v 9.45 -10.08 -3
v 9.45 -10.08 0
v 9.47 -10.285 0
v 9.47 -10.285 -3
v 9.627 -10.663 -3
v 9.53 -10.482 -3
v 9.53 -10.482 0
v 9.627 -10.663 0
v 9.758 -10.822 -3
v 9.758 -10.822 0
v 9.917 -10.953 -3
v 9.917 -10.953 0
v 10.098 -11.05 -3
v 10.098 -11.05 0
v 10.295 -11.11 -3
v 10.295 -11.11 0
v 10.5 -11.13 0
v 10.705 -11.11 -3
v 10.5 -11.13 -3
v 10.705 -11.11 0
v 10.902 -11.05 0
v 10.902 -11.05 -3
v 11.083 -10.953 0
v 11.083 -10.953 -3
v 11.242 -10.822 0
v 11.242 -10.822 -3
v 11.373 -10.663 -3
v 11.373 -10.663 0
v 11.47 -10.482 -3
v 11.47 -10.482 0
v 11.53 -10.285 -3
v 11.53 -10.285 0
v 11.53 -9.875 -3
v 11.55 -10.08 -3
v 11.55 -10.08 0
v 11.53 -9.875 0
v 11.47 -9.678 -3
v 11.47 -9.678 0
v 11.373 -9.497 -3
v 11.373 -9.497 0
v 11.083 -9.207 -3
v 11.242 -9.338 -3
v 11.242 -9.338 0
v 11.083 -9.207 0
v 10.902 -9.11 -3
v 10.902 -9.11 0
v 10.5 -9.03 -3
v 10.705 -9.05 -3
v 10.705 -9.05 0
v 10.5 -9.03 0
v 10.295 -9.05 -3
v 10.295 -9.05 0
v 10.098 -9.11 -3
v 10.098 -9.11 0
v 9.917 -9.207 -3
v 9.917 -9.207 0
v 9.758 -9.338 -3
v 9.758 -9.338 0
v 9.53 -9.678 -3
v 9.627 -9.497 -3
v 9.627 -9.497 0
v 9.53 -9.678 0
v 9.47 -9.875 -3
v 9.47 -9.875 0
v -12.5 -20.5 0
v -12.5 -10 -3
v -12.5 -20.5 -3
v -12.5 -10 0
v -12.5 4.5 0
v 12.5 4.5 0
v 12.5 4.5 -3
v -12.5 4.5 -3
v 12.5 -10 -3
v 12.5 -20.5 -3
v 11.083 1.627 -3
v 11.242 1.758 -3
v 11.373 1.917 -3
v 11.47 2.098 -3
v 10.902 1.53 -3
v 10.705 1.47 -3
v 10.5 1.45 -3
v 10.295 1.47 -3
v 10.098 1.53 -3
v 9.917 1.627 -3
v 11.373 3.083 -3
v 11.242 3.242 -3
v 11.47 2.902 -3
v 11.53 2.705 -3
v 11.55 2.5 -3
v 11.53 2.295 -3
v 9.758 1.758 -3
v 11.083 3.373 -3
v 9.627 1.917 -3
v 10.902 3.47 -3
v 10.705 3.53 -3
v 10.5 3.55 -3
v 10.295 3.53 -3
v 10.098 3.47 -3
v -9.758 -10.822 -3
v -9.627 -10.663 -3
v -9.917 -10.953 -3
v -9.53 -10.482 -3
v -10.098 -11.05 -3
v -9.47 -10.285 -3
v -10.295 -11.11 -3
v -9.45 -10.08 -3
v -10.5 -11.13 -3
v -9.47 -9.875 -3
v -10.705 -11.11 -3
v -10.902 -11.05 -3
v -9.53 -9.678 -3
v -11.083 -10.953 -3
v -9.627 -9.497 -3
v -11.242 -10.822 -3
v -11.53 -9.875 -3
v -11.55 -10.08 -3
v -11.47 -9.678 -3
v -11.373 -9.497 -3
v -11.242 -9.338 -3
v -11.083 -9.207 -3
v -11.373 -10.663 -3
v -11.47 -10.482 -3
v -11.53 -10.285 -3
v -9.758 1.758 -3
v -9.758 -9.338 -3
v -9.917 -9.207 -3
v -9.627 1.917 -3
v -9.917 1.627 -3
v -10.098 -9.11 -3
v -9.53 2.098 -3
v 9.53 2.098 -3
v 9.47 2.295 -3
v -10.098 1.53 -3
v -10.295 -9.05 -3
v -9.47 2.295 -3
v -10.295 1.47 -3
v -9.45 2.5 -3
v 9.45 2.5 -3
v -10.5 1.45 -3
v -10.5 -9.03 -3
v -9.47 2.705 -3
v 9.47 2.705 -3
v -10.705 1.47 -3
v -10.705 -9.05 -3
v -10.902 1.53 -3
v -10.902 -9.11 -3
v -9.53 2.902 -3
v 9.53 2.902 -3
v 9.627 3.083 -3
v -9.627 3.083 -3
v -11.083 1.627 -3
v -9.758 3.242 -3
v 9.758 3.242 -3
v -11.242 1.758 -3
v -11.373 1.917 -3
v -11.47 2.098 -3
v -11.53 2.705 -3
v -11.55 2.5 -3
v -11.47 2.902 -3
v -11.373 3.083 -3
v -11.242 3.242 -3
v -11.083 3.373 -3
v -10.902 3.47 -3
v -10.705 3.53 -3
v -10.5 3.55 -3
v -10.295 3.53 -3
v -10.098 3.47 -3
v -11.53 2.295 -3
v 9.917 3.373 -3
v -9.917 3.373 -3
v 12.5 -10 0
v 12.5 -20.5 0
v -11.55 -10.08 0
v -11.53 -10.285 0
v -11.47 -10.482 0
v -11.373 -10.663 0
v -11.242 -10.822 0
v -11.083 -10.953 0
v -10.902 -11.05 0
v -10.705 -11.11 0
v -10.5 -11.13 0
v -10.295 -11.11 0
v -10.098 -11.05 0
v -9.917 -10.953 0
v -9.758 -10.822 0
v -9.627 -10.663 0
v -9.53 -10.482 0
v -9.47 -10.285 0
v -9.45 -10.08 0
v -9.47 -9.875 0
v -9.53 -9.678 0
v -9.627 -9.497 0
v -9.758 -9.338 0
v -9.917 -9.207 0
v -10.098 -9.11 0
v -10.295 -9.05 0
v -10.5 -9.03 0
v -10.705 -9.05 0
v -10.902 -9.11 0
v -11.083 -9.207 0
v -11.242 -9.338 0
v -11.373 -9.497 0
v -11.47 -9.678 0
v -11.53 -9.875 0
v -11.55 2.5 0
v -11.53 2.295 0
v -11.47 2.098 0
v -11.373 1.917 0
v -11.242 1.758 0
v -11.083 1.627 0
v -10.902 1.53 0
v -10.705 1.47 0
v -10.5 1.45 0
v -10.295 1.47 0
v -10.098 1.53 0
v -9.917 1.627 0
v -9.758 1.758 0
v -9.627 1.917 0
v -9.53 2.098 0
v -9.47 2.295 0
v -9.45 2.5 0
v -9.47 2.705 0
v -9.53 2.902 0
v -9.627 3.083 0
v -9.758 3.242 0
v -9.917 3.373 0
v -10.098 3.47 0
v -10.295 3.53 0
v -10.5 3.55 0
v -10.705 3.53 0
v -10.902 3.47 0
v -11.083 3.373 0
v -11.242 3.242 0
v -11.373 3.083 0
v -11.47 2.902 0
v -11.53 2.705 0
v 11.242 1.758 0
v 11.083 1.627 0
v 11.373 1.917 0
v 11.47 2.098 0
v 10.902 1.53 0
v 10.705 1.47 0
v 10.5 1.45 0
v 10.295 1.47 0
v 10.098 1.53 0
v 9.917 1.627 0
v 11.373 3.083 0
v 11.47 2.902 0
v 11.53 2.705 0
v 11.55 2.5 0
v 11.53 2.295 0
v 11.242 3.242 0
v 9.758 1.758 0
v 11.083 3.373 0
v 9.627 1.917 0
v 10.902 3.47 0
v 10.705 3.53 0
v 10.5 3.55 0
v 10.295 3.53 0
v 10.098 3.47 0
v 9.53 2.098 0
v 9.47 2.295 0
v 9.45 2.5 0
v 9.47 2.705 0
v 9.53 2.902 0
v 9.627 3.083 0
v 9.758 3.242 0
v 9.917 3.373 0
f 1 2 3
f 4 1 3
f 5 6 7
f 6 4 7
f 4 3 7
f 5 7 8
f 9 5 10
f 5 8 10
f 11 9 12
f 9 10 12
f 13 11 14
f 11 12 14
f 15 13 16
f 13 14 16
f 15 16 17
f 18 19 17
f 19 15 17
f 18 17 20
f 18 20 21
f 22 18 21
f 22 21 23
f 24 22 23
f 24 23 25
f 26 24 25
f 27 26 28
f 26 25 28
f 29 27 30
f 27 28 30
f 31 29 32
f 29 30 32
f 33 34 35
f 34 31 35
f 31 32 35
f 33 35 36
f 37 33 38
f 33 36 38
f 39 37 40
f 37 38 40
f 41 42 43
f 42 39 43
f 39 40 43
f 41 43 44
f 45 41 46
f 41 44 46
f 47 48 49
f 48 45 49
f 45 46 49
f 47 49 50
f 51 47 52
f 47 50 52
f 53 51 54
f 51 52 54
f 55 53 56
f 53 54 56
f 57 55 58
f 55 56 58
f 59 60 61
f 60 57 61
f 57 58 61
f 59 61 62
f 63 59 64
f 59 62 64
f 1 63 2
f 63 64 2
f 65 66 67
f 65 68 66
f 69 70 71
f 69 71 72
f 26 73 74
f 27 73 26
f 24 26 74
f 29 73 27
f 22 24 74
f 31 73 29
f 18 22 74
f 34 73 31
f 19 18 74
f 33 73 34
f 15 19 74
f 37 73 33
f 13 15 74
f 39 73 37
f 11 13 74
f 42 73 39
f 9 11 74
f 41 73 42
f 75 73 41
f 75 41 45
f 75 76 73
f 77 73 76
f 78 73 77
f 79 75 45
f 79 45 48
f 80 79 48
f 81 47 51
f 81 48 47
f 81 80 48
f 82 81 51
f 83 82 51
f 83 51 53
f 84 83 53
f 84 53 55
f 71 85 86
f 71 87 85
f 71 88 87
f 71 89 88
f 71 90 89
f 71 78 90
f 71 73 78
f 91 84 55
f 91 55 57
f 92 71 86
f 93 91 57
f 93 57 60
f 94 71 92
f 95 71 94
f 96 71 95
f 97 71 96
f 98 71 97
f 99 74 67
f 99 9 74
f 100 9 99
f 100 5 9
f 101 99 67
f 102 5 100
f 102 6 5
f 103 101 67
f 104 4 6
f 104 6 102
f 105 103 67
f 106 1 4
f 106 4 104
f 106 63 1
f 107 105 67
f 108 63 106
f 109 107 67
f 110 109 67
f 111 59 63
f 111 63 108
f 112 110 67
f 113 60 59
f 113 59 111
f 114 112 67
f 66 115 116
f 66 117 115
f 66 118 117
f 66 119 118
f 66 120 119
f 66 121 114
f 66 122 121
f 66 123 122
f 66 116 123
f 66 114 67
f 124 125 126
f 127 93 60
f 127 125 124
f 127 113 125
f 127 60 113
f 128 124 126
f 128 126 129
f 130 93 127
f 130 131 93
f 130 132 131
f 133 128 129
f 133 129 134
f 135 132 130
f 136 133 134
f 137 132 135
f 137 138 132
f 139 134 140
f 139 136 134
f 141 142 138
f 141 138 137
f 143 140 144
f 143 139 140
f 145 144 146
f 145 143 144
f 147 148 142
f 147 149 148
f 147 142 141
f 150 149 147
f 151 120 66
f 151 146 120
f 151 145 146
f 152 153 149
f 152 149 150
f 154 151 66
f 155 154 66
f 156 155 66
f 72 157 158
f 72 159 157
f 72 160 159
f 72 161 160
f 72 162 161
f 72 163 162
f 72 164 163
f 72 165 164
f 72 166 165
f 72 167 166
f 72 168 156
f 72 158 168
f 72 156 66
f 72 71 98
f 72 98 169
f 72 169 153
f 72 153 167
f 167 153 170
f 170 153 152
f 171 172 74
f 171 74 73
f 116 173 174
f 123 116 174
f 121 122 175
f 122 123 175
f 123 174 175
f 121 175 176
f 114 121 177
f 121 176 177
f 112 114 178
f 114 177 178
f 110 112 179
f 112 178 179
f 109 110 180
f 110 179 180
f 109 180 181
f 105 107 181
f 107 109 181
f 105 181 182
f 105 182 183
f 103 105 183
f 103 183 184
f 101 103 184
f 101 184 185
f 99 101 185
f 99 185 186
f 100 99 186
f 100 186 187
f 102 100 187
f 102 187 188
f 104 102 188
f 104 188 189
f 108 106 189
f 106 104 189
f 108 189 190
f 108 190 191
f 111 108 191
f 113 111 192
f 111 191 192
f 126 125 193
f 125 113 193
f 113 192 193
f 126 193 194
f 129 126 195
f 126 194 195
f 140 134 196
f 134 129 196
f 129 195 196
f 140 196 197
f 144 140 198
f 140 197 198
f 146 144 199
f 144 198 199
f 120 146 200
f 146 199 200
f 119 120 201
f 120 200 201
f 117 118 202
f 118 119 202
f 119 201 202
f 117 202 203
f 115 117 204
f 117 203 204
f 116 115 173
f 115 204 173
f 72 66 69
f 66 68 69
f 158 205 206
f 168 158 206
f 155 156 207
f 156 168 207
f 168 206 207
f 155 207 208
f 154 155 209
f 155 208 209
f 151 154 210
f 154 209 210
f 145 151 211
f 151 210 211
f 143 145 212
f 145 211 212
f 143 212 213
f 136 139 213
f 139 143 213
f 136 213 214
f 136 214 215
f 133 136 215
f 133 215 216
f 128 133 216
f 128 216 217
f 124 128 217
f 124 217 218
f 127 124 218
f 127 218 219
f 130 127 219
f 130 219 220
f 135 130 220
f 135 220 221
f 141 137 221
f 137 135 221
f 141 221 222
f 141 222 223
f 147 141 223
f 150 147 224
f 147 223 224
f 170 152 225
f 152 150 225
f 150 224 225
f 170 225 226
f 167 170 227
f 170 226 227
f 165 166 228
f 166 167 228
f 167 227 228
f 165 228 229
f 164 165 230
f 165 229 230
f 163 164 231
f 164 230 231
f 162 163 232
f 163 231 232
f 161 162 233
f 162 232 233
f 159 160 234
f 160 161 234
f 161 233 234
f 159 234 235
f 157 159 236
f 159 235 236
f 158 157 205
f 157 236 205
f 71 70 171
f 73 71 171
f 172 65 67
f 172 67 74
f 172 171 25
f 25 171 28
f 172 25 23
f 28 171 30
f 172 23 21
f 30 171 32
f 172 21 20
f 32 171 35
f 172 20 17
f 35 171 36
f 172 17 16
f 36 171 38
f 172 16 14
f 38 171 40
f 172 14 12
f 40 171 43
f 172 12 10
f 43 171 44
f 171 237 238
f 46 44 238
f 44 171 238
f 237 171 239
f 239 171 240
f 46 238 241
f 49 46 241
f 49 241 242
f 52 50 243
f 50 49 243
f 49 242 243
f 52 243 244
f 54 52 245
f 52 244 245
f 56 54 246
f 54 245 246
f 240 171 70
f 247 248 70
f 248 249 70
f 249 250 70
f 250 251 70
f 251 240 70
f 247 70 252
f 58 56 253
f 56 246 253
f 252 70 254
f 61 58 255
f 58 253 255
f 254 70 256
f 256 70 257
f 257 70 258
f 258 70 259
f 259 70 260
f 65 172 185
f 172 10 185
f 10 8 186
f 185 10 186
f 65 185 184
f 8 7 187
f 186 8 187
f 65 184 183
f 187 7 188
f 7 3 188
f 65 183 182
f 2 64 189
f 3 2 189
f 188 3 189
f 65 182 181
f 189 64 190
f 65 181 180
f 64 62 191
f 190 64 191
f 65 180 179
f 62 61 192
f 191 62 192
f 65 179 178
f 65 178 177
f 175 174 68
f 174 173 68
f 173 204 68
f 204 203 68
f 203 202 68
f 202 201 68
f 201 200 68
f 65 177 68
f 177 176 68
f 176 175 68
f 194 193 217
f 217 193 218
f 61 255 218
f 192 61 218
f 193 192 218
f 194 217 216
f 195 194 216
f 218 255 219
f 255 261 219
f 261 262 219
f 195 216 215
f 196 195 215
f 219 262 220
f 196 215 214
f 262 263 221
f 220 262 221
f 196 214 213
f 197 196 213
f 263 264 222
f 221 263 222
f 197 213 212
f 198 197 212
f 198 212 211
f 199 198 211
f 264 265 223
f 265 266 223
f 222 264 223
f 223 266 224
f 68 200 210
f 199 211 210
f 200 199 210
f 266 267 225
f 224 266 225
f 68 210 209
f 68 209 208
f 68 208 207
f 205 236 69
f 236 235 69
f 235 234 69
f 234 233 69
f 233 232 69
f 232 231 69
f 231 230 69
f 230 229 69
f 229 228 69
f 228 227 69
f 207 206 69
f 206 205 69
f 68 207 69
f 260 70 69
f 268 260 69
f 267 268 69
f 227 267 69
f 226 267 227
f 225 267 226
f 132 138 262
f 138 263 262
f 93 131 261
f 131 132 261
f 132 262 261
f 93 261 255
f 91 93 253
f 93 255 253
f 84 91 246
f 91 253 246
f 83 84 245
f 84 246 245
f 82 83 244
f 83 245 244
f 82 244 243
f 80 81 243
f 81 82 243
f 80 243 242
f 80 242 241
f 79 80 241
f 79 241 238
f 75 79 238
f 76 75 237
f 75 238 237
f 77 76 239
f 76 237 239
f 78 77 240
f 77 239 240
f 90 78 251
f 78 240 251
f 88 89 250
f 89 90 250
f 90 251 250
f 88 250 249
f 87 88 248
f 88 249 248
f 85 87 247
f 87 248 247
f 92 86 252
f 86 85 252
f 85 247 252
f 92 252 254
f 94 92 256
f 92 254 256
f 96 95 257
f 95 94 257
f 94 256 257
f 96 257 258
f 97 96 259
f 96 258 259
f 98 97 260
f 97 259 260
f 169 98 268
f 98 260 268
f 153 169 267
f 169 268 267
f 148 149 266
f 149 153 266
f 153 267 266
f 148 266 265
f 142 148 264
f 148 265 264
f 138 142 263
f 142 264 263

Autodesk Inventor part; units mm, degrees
ref_plane "YZ Plane" through (0, 0, 0) normal (1, 0, 0) x (0, 1, 0)
ref_plane "XZ Plane" through (0, 0, 0) normal (0, 1, 0) x (-1, 0, 0)
ref_plane "Plano de trabajo1" through (10.95, 6.5, 0) normal (0, 0, -1) x (-1, 0, 0)
sketch "Boceto1" plane through (10.95, 6.5, 0) normal (0, 0, -1) x (-1, 0, 0)
  circle A0 centre (0.45, -4) radius 1.05 projected
  circle A1 centre (21.45, -4) radius 1.05 projected
  circle A2 centre (21.45, -16.58) radius 1.05 projected
  circle A3 centre (0.45, -16.58) radius 1.05 projected
  line L0 (-1.55, 3.5) -> (-1.55, -16.5) projected
  line L1 (0.45, -18.5) -> (21.45, -18.5) projected
  line L2 (23.45, -16.5) -> (23.45, 3.5) projected
  line L3 (-1.55, -2) -> (23.45, -2)
  line L4 (23.45, -2) -> (23.45, -27)
  line L5 (23.45, -27) -> (-1.55, -27)
  line L6 (-1.55, -27) -> (-1.55, -2)
  circle A4 centre (0.45, -4) radius 1.05
  circle A5 centre (21.45, -4) radius 1.05
  circle A6 centre (0.45, -16.58) radius 1.05
  circle A7 centre (21.45, -16.58) radius 1.05
  point P0 (10.95, -6.5)
  point P1 (0, 0)
  dimension "d1" = 2
  dimension "d3" = 25
extrude "Extrusión1" add sketch "Boceto1" along normal blind 3
properties part number "RPi_Camera_V2.1"
